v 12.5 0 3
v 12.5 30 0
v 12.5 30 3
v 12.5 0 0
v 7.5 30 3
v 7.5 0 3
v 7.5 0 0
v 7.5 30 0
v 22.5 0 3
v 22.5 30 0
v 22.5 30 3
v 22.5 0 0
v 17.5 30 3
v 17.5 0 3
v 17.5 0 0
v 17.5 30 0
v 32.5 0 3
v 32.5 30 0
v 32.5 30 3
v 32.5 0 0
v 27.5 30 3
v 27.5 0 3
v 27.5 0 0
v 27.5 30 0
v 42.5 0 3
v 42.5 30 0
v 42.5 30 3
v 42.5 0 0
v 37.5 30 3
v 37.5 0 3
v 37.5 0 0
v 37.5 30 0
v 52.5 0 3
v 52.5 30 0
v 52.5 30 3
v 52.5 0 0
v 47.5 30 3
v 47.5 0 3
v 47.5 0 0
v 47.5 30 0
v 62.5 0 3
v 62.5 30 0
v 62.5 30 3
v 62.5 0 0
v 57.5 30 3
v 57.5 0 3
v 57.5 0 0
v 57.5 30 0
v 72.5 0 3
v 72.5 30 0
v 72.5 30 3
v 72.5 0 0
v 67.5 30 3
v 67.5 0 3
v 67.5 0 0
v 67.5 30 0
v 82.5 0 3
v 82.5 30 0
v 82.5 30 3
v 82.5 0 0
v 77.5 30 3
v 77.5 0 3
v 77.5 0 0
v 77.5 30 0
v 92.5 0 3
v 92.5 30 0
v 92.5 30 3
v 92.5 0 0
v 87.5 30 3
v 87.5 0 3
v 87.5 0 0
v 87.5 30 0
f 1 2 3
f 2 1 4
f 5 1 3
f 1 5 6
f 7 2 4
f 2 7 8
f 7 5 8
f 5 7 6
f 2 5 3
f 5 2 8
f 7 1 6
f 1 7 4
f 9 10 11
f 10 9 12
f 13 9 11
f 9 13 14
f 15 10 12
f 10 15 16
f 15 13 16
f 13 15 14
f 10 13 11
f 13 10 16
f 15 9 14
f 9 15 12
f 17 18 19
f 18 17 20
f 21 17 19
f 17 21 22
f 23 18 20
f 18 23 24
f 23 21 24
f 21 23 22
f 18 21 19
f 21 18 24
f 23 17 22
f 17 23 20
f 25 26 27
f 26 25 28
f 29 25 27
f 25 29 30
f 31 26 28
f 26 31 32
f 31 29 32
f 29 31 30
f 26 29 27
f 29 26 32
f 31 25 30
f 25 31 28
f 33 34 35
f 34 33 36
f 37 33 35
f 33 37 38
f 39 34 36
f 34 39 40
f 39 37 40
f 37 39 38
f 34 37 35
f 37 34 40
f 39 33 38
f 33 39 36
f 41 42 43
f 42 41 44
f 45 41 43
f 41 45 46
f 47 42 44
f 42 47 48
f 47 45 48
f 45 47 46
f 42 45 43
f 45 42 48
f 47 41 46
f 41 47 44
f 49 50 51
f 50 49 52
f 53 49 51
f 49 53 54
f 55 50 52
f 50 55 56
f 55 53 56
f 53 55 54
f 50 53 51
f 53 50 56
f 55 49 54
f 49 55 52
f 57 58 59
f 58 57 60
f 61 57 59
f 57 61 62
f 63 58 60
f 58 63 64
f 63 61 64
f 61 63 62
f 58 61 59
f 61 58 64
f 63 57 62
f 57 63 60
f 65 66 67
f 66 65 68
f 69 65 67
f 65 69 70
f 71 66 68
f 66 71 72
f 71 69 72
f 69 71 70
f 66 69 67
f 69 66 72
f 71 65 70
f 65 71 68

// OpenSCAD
// file: ../../math/vect.scad
function vect_scalar_sum(v, incr) = [for (i = [0: len(v) - 1]) v[i] + incr];

function vSize(size) = (!is_list(size)) ? [size, size, size]: size; 


function vect_2d_to_3d(vect, z = 0) = [vect[0], vect[1], z];

function vect_rotate2d(vect, b) = [
    cos(b) * vect[0] - sin(b) * vect[1],
    sin(b) * vect[0] + cos(b) * vect[1]
];

function round_vect(v) = [for (i = [0: len(v) - 1]) round(v[i])];

function vect_swap_xy(v1) = [v1.y, v1.x, v1.z];

function vectorize_2(x) = is_list(x) ? [x.x, x.y] : [x, x];

function vectorize_3(x) = is_list(x) ? [x.x, x.y, x.z] : [x, x, x];

echo (vectorize_3(1));
// file: ../../math/align.scad
use <vect.scad>
module align_center(sizes, center = true, centerZ = false, vector=[1, 1, 0]){
    xxx=vector.x;
    yyy=vector.y;
    zzz=centerZ || vector.z;
    sizes = vSize(sizes);
    if (center){
        translate([xxx ? -sizes[0] / 2 : 0, yyy ? -sizes[1] / 2: 0, zzz ? -sizes[2]/2 : 0]){
            children();
        }
    } else {
        children();
    }   
}

module align_uncenter(sizes, uncenter = true, uncenterZ = false){
    sizes = vSize(sizes);
    if (uncenter){
        translate([sizes[0] / 2, sizes[1] / 2, (uncenterZ ? sizes[2]/2 : 0)]){
            children();
        }
    } else {
        children();
    }   
}

ALIGN_LEFT=[1, 0, 0];
ALIGN_RIGHT=[-1, 0, 0];
ALIGN_BOTTOM=[0, 0, -1];
ALIGN_TOP=[0, 0, 1];
ALIGN_BACK=[0, -1, 0];
ALIGN_FWD=[0, 1, 0];

function _aligner(target, source, align) = 
            align > 0 ? target * align:
            align < 0 ? source * align:
            (target - source) / 2;    

function aligner(target_sizes, source_sizes, vector) = [
    vector.x == undef ? 0 : _aligner(target_sizes.x, source_sizes.x, vector.x),
    vector.y == undef ? 0 : _aligner(target_sizes.y, source_sizes.y, vector.y),
    vector.z == undef ? 0 : _aligner(target_sizes.z, source_sizes.z, vector.z)
];

module align_relative(
    target_sizes, 
    source_sizes, 
    vector=[0,0,undef]
    ){
        
    // x = vector.x == undef ? 0 : _aligner(target_sizes.y, source_sizes.x, vector.x);
    // y = vector.y == undef ? 0 : _aligner(target_sizes.y, source_sizes.y, vector.y);
    // z = vector.z == undef ? 0 : _aligner(target_sizes.z, source_sizes.z, vector.z);
    to_translate = aligner(target_sizes, source_sizes, vector);
    echo(to_translate);
    translate(to_translate)
        children();
}

module align_center_source_vs_target(target_sizes, source_sizes, centerZ = false){
    align_relative(target_sizes=target_sizes, source_sizes=source_sizes, vector=[0, 0, centerZ ? 1 : 0])
        children();
}


module zz(z){
    translate([0, 0, z])
        children();
}

module xx(x){
    translate([x, 0, 0])
        children();
}

module yy(y){
    translate([0, y, 0])
        children();
}

module rz(z){
    rotate([0, 0, z])
        children();
}

module rx(x){
    rotate([x, 0, 0])
        children();
}

module ry(y){
    rotate([0, y, 0])
        children();
}

module zc(){
    translate([0, 0, -0.01])
        children();
}
module xc(){
    translate([-0.01, 0, 0])    
        children();
}
module yc(){
    translate([0, -0.01, 0])
        children();
}

// align_center_source_vs_target([100, 100, 1], [10, 10, 10], centerZ = false){
//     cube([100,100,1]);
//     cube([10,10,10]);
// }

// align_center(20){
//     align_uncenter(20){
//         cube(20);
//     }
// }

// target_sizes = [20, 20, 20];
// source_sizes = [10, 10, 10];
// color("azure",0.25)
//     cube(size=target_sizes);
// align_relative(target_sizes=target_sizes, source_sizes=source_sizes, vector=[0, 0, undef]){
//     color("red",0.25)
//         zz(20)
//         cube(size=source_sizes);
// }
// main file
use <../../math/align.scad>

module chassis_vent(w, h, wall_width, hole_width = 5){
    margin = hole_width;
    dist = (hole_width * 2);
    num = (w - margin * 2 - hole_width) / dist;
    for ( i = [0 : num] ){
        xx(hole_width / 2 + margin + i * dist) cube([hole_width , h, wall_width]);
    }
}

chassis_vent(100, 30, 3);
